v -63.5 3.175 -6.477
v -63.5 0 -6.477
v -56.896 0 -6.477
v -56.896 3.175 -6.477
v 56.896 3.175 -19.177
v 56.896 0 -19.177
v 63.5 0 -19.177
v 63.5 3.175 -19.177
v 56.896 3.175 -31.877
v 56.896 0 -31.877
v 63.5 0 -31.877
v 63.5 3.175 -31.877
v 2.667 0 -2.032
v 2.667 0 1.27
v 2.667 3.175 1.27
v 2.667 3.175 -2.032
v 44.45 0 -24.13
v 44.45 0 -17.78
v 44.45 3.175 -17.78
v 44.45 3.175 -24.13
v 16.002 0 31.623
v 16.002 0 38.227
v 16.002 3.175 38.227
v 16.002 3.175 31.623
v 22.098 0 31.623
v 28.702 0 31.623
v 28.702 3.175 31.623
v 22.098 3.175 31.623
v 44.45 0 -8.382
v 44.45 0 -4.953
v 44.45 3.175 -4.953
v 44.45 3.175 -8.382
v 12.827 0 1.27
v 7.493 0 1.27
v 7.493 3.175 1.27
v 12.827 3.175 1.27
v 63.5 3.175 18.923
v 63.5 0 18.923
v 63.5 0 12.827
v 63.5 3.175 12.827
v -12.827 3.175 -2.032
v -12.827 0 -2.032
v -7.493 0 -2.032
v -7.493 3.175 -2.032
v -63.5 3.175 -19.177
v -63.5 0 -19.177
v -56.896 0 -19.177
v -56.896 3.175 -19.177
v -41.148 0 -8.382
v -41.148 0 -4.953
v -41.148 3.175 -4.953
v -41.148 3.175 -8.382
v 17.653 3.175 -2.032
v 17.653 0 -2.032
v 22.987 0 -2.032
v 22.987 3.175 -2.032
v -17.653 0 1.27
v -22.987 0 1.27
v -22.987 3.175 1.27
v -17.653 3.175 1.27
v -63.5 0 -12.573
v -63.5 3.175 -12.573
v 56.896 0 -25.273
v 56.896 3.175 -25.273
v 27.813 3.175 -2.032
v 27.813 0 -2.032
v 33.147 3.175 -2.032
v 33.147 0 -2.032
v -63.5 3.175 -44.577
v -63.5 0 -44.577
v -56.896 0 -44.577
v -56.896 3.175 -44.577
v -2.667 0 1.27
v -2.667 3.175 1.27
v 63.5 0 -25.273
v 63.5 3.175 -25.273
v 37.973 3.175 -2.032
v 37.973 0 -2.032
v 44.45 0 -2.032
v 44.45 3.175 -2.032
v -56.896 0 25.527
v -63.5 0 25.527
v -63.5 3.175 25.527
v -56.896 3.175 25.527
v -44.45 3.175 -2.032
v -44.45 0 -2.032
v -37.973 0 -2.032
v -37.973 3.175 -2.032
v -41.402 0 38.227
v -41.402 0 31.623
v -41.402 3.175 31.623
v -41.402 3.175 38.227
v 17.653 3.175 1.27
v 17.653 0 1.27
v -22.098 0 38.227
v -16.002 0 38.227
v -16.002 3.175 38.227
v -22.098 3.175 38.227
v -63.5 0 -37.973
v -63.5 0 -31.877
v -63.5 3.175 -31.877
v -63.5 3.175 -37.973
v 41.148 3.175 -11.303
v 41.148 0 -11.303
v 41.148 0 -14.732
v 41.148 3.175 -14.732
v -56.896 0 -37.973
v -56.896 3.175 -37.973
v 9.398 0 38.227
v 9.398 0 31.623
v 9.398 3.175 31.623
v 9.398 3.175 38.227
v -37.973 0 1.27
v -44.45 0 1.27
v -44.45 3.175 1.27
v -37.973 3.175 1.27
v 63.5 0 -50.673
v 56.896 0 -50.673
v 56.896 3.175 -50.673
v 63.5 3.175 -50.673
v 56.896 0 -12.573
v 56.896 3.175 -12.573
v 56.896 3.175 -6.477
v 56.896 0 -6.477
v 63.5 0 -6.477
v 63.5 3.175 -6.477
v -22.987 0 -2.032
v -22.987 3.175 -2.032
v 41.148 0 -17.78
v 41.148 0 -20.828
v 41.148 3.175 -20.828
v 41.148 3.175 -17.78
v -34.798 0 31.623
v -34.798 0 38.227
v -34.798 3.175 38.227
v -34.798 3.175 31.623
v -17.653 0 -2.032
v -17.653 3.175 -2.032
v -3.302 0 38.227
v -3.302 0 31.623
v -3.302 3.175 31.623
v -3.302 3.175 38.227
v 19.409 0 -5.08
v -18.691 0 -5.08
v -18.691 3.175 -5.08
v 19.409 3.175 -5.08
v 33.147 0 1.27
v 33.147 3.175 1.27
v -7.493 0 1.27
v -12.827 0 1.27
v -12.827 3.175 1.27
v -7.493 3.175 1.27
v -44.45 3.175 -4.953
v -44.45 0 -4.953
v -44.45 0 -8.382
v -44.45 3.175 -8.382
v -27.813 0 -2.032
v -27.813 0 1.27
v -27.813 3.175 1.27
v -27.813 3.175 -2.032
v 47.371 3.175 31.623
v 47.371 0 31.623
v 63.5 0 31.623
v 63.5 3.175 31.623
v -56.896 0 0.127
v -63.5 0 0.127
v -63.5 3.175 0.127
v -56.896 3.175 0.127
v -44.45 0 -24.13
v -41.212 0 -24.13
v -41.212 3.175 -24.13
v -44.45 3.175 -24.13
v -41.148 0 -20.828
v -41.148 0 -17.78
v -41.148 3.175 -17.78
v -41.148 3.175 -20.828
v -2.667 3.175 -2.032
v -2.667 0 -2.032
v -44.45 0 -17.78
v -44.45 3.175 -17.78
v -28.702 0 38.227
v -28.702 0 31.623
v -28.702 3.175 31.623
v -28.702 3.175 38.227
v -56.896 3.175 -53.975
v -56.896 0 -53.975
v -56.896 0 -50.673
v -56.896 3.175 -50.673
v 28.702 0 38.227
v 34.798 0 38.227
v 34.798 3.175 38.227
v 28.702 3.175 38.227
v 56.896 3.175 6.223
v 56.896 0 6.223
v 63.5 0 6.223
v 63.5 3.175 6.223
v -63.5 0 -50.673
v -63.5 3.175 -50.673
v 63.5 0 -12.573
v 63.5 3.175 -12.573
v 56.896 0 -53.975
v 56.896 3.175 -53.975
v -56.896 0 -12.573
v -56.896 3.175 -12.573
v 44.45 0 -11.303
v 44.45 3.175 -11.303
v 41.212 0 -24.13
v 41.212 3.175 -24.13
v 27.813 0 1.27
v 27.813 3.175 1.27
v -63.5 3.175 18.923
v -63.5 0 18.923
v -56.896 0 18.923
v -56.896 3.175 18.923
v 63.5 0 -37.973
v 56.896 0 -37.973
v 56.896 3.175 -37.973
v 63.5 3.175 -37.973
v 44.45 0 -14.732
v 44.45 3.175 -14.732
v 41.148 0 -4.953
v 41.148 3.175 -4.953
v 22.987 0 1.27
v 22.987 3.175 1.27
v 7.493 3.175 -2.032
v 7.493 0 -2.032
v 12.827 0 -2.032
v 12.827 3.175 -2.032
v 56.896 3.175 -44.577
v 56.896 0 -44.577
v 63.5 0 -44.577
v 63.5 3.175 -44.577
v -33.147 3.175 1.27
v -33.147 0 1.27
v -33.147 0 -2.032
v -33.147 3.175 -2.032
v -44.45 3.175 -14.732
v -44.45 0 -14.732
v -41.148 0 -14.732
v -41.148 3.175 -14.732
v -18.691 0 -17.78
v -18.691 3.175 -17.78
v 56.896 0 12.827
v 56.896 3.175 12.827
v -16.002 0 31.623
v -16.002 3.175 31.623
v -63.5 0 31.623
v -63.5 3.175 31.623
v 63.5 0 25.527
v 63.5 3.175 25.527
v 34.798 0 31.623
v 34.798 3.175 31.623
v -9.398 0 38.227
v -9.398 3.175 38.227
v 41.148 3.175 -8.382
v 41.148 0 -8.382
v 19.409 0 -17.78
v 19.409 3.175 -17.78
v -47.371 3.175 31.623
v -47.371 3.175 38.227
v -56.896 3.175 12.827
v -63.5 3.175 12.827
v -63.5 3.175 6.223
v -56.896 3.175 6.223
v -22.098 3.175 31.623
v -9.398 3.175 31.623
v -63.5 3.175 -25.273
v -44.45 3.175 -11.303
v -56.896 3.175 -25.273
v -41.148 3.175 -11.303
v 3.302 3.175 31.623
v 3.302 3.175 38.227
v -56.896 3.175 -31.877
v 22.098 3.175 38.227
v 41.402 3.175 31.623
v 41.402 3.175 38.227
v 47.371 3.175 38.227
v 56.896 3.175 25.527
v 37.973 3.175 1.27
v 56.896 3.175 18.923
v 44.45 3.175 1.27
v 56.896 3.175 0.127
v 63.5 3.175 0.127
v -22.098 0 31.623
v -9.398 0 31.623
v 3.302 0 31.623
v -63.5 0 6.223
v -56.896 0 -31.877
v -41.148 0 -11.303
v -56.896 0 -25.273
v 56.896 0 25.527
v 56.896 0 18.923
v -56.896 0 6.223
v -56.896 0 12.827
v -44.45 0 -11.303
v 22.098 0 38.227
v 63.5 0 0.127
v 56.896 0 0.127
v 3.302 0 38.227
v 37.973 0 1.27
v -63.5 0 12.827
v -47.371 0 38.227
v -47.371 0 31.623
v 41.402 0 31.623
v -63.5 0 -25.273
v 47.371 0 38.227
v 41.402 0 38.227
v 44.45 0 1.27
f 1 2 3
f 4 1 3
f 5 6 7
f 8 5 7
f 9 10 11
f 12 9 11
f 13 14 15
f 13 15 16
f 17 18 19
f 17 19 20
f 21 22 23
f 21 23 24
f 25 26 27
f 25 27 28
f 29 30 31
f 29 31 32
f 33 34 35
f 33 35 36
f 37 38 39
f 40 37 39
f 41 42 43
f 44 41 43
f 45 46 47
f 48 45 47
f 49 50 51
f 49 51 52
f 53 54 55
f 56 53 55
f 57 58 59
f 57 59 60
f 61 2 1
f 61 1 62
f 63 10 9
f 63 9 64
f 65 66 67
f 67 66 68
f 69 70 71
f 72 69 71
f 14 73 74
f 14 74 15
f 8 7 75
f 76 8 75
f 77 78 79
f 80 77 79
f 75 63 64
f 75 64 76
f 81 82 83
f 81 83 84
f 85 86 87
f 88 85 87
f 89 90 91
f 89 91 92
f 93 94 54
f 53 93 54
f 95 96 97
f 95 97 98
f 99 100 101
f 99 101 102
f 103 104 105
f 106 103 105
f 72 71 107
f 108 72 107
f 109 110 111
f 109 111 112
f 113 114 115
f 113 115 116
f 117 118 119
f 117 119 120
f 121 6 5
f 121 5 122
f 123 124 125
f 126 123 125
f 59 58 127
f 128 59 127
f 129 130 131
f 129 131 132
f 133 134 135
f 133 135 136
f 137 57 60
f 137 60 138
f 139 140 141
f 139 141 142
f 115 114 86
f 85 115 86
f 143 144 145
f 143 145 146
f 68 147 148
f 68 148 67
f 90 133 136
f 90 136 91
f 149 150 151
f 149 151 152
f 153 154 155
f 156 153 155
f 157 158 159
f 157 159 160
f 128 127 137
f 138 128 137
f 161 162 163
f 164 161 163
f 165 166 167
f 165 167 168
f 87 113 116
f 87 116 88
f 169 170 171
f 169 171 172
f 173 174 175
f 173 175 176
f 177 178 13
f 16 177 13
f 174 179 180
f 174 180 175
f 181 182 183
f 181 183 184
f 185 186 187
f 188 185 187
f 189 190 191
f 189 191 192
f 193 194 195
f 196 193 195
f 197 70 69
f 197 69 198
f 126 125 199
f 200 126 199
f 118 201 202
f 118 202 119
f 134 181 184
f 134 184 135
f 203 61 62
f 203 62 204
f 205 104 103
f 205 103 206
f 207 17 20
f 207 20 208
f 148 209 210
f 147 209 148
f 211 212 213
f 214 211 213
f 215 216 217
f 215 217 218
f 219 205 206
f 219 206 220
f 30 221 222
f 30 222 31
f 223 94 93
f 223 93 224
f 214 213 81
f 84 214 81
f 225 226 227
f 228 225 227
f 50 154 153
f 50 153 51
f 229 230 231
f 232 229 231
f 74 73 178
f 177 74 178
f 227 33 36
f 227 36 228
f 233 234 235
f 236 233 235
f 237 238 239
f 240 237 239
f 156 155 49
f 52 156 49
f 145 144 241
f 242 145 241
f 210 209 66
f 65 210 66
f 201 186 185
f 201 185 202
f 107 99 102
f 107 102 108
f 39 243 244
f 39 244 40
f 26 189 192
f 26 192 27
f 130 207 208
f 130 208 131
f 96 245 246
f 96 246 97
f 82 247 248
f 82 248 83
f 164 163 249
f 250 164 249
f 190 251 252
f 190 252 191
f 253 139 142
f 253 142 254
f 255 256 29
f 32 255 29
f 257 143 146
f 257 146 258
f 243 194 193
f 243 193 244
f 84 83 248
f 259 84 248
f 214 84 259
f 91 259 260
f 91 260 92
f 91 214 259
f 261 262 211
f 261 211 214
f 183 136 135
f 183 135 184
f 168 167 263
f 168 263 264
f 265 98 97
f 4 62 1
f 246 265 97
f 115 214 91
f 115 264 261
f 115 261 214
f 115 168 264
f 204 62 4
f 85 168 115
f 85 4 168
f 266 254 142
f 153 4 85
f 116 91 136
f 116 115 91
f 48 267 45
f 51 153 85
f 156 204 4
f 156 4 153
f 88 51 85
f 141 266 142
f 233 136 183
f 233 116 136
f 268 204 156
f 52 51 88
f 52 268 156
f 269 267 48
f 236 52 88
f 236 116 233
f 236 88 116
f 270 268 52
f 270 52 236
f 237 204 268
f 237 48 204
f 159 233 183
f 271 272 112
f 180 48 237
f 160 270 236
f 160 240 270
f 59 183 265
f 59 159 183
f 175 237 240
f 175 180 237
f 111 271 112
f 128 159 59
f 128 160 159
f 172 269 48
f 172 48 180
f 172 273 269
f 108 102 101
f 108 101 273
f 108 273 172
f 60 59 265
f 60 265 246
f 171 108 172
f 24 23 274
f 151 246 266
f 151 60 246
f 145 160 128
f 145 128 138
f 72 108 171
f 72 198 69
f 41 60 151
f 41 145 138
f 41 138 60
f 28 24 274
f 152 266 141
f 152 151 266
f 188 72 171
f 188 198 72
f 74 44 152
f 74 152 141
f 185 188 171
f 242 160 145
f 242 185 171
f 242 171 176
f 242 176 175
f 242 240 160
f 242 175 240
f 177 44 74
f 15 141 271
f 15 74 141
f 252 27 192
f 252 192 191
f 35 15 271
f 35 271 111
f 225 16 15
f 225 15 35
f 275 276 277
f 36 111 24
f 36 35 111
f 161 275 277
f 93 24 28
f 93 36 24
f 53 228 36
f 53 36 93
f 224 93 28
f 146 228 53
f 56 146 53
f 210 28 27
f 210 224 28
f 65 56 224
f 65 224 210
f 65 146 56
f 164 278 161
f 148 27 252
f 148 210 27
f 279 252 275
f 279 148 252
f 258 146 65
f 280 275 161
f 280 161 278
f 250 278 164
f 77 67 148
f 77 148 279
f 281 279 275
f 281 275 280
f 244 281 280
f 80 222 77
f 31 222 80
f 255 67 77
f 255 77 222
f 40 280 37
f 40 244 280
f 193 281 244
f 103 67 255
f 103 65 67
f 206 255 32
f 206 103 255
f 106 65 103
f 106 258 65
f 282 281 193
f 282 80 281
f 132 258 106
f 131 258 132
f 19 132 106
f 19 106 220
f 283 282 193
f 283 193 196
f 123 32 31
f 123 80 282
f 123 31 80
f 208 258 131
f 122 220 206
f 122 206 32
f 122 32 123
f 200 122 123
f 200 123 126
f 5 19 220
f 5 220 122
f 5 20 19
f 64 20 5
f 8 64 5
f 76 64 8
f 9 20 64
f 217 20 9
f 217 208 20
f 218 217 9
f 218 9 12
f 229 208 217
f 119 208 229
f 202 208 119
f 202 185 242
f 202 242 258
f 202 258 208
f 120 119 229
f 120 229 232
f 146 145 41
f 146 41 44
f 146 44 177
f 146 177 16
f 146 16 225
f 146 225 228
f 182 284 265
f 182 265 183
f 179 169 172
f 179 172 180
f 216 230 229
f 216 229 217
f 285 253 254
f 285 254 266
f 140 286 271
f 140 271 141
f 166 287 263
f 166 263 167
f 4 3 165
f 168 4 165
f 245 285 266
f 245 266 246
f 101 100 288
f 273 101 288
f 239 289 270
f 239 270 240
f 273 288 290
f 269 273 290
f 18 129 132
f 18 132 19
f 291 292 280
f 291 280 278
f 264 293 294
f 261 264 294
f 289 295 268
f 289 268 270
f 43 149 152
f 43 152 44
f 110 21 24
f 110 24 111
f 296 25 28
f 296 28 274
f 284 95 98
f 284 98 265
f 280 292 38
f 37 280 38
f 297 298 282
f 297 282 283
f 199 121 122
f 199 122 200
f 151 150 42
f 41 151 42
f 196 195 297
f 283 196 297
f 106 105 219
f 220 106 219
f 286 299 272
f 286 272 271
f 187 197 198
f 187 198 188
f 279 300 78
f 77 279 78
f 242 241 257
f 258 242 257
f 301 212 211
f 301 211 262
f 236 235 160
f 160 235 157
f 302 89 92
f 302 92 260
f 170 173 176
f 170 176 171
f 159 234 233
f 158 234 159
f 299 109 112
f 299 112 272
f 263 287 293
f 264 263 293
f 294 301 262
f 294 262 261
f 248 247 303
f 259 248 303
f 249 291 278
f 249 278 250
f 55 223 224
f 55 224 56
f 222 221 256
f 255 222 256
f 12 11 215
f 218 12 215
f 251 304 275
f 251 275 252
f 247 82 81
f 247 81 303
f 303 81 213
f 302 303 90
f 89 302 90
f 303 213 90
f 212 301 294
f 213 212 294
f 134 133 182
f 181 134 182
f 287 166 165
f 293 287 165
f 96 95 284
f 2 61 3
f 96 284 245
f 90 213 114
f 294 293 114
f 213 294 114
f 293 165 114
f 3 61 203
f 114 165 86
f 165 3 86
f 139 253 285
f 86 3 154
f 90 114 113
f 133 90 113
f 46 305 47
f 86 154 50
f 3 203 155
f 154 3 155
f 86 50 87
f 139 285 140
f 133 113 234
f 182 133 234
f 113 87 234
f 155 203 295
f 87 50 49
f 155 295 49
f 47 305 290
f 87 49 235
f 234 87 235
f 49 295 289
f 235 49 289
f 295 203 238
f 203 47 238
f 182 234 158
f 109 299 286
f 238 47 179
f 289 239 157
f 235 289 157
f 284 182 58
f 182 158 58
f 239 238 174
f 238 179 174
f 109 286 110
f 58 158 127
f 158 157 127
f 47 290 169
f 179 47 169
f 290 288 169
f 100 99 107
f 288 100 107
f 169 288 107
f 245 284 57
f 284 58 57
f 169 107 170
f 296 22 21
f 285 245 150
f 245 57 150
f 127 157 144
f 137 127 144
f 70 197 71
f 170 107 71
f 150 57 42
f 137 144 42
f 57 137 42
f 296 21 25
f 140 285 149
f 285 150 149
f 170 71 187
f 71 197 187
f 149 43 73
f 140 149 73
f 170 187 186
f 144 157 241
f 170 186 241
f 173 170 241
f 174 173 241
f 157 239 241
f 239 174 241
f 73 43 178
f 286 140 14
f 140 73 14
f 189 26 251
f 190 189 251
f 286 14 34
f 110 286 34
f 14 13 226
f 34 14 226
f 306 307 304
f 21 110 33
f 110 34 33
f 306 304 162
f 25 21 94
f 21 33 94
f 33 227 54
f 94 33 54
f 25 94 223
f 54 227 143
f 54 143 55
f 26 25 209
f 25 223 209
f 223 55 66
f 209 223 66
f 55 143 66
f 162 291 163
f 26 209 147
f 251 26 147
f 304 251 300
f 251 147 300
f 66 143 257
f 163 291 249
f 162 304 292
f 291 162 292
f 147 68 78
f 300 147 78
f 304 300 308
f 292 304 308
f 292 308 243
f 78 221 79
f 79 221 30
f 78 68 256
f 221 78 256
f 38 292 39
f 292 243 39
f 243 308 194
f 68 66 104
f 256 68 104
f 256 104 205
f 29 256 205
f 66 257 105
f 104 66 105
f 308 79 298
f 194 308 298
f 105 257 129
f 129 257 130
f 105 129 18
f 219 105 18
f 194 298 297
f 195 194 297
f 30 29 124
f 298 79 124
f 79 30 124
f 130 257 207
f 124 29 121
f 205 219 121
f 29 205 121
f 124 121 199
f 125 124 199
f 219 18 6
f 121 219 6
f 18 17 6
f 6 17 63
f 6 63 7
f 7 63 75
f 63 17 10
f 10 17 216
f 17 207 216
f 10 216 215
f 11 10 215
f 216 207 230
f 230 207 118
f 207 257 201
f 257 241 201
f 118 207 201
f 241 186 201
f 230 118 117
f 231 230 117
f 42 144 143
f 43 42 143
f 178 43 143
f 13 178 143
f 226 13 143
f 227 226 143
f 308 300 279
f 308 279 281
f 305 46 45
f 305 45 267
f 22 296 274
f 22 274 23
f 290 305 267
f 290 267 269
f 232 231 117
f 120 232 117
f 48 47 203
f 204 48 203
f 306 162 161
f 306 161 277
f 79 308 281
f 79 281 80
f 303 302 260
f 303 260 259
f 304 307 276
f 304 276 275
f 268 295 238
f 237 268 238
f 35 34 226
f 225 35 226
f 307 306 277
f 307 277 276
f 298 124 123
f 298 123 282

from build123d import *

# Parameters (mm, degrees)
SKETCH1_W           = 127
SKETCH1_H           = 107.95
BOSS_EXTRUDE1_DEPTH = 3.175
SKETCH2_W           = 6.604
SKETCH2_H           = 6.604
CUT_EXTRUDE1_DEPTH  = 84.400427157
SKETCH3_W           = 6.477
SKETCH3_H           = 3.302
SKETCH3_W_2         = 3.302
SKETCH3_H_2         = 3.429
SKETCH3_W_3         = 5.334
SKETCH3_W_4         = 38.1
SKETCH3_H_3         = 12.7
CUT_EXTRUDE2_DEPTH  = 84.400427157


with BuildPart() as part:
    # Sketch1 → Boss-Extrude1 (new body)
    with BuildSketch(Plane(origin=(0, 0, 0), x_dir=(1, 0, 0), z_dir=(0, 1, 0))):
        Rectangle(SKETCH1_W, SKETCH1_H)
    extrude(amount=BOSS_EXTRUDE1_DEPTH)

    # Sketch2 → Cut-Extrude1 (cut, through all)
    with BuildSketch(Plane.XZ):
        with Locations((60.198, 22.225)):
            Rectangle(SKETCH2_W, SKETCH2_H)
        Polygon((63.5, 38.227), (63.5, 31.623), (56.896, 31.623), (47.371, 31.623), (47.371, 38.227), (41.402, 38.227), (41.402, 31.623), (34.798, 31.623), (34.798, 38.227), (28.702, 38.227), (28.702, 31.623), (22.098, 31.623), (22.098, 38.227), (16.002, 38.227), (16.002, 31.623), (9.398, 31.623), (9.398, 38.227), (3.302, 38.227), (3.302, 31.623), (-3.302, 31.623), (-3.302, 38.227), (-9.398, 38.227), (-9.398, 31.623), (-16.002, 31.623), (-16.002, 38.227), (-22.098, 38.227), (-22.098, 31.623), (-28.702, 31.623), (-28.702, 38.227), (-34.798, 38.227), (-34.798, 31.623), (-41.402, 31.623), (-41.402, 38.227), (-47.371, 38.227), (-47.371, 31.623), (-56.896, 31.623), (-63.5, 31.623), (-63.5, 38.227), (-63.5, 53.975), (63.5, 53.975), align=None)
        with Locations((60.198, 9.525)):
            Rectangle(SKETCH2_W, SKETCH2_H)
        with Locations((60.198, -3.175)):
            Rectangle(SKETCH2_W, SKETCH2_H)
        with Locations((60.198, -15.875)):
            Rectangle(SKETCH2_W, SKETCH2_H)
        with Locations((60.198, -28.575)):
            Rectangle(SKETCH2_W, SKETCH2_H)
        with Locations((60.198, -41.275)):
            Rectangle(SKETCH2_W, SKETCH2_H)
        with Locations((60.198, -53.975)):
            Rectangle(SKETCH2_W, SKETCH2_H)
        with Locations((-60.198, -53.975)):
            Rectangle(SKETCH2_W, SKETCH2_H)
        with Locations((-60.198, -41.275)):
            Rectangle(SKETCH2_W, SKETCH2_H)
        with Locations((-60.198, -28.575)):
            Rectangle(SKETCH2_W, SKETCH2_H)
        with Locations((-60.198, -15.875)):
            Rectangle(SKETCH2_W, SKETCH2_H)
        with Locations((-60.198, -3.175)):
            Rectangle(SKETCH2_W, SKETCH2_H)
        with Locations((-60.198, 9.525)):
            Rectangle(SKETCH2_W, SKETCH2_H)
        with Locations((-60.198, 22.225)):
            Rectangle(SKETCH2_W, SKETCH2_H)
    extrude(amount=-CUT_EXTRUDE1_DEPTH, mode=Mode.SUBTRACT)

    # Sketch3 → Cut-Extrude2 (cut, through all)
    with BuildSketch(Plane(origin=(0, 0, 0), x_dir=(1, 0, 0), z_dir=(0, 1, 0))):
        Polygon((44.45, 24.13), (41.2115, 24.13), (41.148, 20.828), (41.148, 17.78), (44.45, 17.78), align=None)
        with Locations((41.2115, 0.381)):
            Rectangle(SKETCH3_W, SKETCH3_H)
        with Locations((42.799, 6.6675)):
            Rectangle(SKETCH3_W_2, SKETCH3_H_2)
        with Locations((42.799, 13.0175)):
            Rectangle(SKETCH3_W_2, SKETCH3_H_2)
        with Locations((30.48, 0.381)):
            Rectangle(SKETCH3_W_3, SKETCH3_H)
        with Locations((20.32, 0.381)):
            Rectangle(SKETCH3_W_3, SKETCH3_H)
        with Locations((10.16, 0.381)):
            Rectangle(SKETCH3_W_3, SKETCH3_H)
        with Locations((0, 0.381)):
            Rectangle(SKETCH3_W_3, SKETCH3_H)
        with Locations((-10.16, 0.381)):
            Rectangle(SKETCH3_W_3, SKETCH3_H)
        with Locations((-20.32, 0.381)):
            Rectangle(SKETCH3_W_3, SKETCH3_H)
        with Locations((-42.799, 13.0175)):
            Rectangle(SKETCH3_W_2, SKETCH3_H_2)
        Polygon((-44.45, 24.13), (-44.45, 17.78), (-41.148, 17.78), (-41.148, 20.828), (-41.2115, 24.13), align=None)
        with Locations((-42.799, 6.6675)):
            Rectangle(SKETCH3_W_2, SKETCH3_H_2)
        with Locations((-30.48, 0.381)):
            Rectangle(SKETCH3_W_3, SKETCH3_H)
        with Locations((-41.2115, 0.381)):
            Rectangle(SKETCH3_W, SKETCH3_H)
        with Locations((0.358722149, 11.43)):
            Rectangle(SKETCH3_W_4, SKETCH3_H_3)
    extrude(amount=CUT_EXTRUDE2_DEPTH, mode=Mode.SUBTRACT)


solid = part.part
